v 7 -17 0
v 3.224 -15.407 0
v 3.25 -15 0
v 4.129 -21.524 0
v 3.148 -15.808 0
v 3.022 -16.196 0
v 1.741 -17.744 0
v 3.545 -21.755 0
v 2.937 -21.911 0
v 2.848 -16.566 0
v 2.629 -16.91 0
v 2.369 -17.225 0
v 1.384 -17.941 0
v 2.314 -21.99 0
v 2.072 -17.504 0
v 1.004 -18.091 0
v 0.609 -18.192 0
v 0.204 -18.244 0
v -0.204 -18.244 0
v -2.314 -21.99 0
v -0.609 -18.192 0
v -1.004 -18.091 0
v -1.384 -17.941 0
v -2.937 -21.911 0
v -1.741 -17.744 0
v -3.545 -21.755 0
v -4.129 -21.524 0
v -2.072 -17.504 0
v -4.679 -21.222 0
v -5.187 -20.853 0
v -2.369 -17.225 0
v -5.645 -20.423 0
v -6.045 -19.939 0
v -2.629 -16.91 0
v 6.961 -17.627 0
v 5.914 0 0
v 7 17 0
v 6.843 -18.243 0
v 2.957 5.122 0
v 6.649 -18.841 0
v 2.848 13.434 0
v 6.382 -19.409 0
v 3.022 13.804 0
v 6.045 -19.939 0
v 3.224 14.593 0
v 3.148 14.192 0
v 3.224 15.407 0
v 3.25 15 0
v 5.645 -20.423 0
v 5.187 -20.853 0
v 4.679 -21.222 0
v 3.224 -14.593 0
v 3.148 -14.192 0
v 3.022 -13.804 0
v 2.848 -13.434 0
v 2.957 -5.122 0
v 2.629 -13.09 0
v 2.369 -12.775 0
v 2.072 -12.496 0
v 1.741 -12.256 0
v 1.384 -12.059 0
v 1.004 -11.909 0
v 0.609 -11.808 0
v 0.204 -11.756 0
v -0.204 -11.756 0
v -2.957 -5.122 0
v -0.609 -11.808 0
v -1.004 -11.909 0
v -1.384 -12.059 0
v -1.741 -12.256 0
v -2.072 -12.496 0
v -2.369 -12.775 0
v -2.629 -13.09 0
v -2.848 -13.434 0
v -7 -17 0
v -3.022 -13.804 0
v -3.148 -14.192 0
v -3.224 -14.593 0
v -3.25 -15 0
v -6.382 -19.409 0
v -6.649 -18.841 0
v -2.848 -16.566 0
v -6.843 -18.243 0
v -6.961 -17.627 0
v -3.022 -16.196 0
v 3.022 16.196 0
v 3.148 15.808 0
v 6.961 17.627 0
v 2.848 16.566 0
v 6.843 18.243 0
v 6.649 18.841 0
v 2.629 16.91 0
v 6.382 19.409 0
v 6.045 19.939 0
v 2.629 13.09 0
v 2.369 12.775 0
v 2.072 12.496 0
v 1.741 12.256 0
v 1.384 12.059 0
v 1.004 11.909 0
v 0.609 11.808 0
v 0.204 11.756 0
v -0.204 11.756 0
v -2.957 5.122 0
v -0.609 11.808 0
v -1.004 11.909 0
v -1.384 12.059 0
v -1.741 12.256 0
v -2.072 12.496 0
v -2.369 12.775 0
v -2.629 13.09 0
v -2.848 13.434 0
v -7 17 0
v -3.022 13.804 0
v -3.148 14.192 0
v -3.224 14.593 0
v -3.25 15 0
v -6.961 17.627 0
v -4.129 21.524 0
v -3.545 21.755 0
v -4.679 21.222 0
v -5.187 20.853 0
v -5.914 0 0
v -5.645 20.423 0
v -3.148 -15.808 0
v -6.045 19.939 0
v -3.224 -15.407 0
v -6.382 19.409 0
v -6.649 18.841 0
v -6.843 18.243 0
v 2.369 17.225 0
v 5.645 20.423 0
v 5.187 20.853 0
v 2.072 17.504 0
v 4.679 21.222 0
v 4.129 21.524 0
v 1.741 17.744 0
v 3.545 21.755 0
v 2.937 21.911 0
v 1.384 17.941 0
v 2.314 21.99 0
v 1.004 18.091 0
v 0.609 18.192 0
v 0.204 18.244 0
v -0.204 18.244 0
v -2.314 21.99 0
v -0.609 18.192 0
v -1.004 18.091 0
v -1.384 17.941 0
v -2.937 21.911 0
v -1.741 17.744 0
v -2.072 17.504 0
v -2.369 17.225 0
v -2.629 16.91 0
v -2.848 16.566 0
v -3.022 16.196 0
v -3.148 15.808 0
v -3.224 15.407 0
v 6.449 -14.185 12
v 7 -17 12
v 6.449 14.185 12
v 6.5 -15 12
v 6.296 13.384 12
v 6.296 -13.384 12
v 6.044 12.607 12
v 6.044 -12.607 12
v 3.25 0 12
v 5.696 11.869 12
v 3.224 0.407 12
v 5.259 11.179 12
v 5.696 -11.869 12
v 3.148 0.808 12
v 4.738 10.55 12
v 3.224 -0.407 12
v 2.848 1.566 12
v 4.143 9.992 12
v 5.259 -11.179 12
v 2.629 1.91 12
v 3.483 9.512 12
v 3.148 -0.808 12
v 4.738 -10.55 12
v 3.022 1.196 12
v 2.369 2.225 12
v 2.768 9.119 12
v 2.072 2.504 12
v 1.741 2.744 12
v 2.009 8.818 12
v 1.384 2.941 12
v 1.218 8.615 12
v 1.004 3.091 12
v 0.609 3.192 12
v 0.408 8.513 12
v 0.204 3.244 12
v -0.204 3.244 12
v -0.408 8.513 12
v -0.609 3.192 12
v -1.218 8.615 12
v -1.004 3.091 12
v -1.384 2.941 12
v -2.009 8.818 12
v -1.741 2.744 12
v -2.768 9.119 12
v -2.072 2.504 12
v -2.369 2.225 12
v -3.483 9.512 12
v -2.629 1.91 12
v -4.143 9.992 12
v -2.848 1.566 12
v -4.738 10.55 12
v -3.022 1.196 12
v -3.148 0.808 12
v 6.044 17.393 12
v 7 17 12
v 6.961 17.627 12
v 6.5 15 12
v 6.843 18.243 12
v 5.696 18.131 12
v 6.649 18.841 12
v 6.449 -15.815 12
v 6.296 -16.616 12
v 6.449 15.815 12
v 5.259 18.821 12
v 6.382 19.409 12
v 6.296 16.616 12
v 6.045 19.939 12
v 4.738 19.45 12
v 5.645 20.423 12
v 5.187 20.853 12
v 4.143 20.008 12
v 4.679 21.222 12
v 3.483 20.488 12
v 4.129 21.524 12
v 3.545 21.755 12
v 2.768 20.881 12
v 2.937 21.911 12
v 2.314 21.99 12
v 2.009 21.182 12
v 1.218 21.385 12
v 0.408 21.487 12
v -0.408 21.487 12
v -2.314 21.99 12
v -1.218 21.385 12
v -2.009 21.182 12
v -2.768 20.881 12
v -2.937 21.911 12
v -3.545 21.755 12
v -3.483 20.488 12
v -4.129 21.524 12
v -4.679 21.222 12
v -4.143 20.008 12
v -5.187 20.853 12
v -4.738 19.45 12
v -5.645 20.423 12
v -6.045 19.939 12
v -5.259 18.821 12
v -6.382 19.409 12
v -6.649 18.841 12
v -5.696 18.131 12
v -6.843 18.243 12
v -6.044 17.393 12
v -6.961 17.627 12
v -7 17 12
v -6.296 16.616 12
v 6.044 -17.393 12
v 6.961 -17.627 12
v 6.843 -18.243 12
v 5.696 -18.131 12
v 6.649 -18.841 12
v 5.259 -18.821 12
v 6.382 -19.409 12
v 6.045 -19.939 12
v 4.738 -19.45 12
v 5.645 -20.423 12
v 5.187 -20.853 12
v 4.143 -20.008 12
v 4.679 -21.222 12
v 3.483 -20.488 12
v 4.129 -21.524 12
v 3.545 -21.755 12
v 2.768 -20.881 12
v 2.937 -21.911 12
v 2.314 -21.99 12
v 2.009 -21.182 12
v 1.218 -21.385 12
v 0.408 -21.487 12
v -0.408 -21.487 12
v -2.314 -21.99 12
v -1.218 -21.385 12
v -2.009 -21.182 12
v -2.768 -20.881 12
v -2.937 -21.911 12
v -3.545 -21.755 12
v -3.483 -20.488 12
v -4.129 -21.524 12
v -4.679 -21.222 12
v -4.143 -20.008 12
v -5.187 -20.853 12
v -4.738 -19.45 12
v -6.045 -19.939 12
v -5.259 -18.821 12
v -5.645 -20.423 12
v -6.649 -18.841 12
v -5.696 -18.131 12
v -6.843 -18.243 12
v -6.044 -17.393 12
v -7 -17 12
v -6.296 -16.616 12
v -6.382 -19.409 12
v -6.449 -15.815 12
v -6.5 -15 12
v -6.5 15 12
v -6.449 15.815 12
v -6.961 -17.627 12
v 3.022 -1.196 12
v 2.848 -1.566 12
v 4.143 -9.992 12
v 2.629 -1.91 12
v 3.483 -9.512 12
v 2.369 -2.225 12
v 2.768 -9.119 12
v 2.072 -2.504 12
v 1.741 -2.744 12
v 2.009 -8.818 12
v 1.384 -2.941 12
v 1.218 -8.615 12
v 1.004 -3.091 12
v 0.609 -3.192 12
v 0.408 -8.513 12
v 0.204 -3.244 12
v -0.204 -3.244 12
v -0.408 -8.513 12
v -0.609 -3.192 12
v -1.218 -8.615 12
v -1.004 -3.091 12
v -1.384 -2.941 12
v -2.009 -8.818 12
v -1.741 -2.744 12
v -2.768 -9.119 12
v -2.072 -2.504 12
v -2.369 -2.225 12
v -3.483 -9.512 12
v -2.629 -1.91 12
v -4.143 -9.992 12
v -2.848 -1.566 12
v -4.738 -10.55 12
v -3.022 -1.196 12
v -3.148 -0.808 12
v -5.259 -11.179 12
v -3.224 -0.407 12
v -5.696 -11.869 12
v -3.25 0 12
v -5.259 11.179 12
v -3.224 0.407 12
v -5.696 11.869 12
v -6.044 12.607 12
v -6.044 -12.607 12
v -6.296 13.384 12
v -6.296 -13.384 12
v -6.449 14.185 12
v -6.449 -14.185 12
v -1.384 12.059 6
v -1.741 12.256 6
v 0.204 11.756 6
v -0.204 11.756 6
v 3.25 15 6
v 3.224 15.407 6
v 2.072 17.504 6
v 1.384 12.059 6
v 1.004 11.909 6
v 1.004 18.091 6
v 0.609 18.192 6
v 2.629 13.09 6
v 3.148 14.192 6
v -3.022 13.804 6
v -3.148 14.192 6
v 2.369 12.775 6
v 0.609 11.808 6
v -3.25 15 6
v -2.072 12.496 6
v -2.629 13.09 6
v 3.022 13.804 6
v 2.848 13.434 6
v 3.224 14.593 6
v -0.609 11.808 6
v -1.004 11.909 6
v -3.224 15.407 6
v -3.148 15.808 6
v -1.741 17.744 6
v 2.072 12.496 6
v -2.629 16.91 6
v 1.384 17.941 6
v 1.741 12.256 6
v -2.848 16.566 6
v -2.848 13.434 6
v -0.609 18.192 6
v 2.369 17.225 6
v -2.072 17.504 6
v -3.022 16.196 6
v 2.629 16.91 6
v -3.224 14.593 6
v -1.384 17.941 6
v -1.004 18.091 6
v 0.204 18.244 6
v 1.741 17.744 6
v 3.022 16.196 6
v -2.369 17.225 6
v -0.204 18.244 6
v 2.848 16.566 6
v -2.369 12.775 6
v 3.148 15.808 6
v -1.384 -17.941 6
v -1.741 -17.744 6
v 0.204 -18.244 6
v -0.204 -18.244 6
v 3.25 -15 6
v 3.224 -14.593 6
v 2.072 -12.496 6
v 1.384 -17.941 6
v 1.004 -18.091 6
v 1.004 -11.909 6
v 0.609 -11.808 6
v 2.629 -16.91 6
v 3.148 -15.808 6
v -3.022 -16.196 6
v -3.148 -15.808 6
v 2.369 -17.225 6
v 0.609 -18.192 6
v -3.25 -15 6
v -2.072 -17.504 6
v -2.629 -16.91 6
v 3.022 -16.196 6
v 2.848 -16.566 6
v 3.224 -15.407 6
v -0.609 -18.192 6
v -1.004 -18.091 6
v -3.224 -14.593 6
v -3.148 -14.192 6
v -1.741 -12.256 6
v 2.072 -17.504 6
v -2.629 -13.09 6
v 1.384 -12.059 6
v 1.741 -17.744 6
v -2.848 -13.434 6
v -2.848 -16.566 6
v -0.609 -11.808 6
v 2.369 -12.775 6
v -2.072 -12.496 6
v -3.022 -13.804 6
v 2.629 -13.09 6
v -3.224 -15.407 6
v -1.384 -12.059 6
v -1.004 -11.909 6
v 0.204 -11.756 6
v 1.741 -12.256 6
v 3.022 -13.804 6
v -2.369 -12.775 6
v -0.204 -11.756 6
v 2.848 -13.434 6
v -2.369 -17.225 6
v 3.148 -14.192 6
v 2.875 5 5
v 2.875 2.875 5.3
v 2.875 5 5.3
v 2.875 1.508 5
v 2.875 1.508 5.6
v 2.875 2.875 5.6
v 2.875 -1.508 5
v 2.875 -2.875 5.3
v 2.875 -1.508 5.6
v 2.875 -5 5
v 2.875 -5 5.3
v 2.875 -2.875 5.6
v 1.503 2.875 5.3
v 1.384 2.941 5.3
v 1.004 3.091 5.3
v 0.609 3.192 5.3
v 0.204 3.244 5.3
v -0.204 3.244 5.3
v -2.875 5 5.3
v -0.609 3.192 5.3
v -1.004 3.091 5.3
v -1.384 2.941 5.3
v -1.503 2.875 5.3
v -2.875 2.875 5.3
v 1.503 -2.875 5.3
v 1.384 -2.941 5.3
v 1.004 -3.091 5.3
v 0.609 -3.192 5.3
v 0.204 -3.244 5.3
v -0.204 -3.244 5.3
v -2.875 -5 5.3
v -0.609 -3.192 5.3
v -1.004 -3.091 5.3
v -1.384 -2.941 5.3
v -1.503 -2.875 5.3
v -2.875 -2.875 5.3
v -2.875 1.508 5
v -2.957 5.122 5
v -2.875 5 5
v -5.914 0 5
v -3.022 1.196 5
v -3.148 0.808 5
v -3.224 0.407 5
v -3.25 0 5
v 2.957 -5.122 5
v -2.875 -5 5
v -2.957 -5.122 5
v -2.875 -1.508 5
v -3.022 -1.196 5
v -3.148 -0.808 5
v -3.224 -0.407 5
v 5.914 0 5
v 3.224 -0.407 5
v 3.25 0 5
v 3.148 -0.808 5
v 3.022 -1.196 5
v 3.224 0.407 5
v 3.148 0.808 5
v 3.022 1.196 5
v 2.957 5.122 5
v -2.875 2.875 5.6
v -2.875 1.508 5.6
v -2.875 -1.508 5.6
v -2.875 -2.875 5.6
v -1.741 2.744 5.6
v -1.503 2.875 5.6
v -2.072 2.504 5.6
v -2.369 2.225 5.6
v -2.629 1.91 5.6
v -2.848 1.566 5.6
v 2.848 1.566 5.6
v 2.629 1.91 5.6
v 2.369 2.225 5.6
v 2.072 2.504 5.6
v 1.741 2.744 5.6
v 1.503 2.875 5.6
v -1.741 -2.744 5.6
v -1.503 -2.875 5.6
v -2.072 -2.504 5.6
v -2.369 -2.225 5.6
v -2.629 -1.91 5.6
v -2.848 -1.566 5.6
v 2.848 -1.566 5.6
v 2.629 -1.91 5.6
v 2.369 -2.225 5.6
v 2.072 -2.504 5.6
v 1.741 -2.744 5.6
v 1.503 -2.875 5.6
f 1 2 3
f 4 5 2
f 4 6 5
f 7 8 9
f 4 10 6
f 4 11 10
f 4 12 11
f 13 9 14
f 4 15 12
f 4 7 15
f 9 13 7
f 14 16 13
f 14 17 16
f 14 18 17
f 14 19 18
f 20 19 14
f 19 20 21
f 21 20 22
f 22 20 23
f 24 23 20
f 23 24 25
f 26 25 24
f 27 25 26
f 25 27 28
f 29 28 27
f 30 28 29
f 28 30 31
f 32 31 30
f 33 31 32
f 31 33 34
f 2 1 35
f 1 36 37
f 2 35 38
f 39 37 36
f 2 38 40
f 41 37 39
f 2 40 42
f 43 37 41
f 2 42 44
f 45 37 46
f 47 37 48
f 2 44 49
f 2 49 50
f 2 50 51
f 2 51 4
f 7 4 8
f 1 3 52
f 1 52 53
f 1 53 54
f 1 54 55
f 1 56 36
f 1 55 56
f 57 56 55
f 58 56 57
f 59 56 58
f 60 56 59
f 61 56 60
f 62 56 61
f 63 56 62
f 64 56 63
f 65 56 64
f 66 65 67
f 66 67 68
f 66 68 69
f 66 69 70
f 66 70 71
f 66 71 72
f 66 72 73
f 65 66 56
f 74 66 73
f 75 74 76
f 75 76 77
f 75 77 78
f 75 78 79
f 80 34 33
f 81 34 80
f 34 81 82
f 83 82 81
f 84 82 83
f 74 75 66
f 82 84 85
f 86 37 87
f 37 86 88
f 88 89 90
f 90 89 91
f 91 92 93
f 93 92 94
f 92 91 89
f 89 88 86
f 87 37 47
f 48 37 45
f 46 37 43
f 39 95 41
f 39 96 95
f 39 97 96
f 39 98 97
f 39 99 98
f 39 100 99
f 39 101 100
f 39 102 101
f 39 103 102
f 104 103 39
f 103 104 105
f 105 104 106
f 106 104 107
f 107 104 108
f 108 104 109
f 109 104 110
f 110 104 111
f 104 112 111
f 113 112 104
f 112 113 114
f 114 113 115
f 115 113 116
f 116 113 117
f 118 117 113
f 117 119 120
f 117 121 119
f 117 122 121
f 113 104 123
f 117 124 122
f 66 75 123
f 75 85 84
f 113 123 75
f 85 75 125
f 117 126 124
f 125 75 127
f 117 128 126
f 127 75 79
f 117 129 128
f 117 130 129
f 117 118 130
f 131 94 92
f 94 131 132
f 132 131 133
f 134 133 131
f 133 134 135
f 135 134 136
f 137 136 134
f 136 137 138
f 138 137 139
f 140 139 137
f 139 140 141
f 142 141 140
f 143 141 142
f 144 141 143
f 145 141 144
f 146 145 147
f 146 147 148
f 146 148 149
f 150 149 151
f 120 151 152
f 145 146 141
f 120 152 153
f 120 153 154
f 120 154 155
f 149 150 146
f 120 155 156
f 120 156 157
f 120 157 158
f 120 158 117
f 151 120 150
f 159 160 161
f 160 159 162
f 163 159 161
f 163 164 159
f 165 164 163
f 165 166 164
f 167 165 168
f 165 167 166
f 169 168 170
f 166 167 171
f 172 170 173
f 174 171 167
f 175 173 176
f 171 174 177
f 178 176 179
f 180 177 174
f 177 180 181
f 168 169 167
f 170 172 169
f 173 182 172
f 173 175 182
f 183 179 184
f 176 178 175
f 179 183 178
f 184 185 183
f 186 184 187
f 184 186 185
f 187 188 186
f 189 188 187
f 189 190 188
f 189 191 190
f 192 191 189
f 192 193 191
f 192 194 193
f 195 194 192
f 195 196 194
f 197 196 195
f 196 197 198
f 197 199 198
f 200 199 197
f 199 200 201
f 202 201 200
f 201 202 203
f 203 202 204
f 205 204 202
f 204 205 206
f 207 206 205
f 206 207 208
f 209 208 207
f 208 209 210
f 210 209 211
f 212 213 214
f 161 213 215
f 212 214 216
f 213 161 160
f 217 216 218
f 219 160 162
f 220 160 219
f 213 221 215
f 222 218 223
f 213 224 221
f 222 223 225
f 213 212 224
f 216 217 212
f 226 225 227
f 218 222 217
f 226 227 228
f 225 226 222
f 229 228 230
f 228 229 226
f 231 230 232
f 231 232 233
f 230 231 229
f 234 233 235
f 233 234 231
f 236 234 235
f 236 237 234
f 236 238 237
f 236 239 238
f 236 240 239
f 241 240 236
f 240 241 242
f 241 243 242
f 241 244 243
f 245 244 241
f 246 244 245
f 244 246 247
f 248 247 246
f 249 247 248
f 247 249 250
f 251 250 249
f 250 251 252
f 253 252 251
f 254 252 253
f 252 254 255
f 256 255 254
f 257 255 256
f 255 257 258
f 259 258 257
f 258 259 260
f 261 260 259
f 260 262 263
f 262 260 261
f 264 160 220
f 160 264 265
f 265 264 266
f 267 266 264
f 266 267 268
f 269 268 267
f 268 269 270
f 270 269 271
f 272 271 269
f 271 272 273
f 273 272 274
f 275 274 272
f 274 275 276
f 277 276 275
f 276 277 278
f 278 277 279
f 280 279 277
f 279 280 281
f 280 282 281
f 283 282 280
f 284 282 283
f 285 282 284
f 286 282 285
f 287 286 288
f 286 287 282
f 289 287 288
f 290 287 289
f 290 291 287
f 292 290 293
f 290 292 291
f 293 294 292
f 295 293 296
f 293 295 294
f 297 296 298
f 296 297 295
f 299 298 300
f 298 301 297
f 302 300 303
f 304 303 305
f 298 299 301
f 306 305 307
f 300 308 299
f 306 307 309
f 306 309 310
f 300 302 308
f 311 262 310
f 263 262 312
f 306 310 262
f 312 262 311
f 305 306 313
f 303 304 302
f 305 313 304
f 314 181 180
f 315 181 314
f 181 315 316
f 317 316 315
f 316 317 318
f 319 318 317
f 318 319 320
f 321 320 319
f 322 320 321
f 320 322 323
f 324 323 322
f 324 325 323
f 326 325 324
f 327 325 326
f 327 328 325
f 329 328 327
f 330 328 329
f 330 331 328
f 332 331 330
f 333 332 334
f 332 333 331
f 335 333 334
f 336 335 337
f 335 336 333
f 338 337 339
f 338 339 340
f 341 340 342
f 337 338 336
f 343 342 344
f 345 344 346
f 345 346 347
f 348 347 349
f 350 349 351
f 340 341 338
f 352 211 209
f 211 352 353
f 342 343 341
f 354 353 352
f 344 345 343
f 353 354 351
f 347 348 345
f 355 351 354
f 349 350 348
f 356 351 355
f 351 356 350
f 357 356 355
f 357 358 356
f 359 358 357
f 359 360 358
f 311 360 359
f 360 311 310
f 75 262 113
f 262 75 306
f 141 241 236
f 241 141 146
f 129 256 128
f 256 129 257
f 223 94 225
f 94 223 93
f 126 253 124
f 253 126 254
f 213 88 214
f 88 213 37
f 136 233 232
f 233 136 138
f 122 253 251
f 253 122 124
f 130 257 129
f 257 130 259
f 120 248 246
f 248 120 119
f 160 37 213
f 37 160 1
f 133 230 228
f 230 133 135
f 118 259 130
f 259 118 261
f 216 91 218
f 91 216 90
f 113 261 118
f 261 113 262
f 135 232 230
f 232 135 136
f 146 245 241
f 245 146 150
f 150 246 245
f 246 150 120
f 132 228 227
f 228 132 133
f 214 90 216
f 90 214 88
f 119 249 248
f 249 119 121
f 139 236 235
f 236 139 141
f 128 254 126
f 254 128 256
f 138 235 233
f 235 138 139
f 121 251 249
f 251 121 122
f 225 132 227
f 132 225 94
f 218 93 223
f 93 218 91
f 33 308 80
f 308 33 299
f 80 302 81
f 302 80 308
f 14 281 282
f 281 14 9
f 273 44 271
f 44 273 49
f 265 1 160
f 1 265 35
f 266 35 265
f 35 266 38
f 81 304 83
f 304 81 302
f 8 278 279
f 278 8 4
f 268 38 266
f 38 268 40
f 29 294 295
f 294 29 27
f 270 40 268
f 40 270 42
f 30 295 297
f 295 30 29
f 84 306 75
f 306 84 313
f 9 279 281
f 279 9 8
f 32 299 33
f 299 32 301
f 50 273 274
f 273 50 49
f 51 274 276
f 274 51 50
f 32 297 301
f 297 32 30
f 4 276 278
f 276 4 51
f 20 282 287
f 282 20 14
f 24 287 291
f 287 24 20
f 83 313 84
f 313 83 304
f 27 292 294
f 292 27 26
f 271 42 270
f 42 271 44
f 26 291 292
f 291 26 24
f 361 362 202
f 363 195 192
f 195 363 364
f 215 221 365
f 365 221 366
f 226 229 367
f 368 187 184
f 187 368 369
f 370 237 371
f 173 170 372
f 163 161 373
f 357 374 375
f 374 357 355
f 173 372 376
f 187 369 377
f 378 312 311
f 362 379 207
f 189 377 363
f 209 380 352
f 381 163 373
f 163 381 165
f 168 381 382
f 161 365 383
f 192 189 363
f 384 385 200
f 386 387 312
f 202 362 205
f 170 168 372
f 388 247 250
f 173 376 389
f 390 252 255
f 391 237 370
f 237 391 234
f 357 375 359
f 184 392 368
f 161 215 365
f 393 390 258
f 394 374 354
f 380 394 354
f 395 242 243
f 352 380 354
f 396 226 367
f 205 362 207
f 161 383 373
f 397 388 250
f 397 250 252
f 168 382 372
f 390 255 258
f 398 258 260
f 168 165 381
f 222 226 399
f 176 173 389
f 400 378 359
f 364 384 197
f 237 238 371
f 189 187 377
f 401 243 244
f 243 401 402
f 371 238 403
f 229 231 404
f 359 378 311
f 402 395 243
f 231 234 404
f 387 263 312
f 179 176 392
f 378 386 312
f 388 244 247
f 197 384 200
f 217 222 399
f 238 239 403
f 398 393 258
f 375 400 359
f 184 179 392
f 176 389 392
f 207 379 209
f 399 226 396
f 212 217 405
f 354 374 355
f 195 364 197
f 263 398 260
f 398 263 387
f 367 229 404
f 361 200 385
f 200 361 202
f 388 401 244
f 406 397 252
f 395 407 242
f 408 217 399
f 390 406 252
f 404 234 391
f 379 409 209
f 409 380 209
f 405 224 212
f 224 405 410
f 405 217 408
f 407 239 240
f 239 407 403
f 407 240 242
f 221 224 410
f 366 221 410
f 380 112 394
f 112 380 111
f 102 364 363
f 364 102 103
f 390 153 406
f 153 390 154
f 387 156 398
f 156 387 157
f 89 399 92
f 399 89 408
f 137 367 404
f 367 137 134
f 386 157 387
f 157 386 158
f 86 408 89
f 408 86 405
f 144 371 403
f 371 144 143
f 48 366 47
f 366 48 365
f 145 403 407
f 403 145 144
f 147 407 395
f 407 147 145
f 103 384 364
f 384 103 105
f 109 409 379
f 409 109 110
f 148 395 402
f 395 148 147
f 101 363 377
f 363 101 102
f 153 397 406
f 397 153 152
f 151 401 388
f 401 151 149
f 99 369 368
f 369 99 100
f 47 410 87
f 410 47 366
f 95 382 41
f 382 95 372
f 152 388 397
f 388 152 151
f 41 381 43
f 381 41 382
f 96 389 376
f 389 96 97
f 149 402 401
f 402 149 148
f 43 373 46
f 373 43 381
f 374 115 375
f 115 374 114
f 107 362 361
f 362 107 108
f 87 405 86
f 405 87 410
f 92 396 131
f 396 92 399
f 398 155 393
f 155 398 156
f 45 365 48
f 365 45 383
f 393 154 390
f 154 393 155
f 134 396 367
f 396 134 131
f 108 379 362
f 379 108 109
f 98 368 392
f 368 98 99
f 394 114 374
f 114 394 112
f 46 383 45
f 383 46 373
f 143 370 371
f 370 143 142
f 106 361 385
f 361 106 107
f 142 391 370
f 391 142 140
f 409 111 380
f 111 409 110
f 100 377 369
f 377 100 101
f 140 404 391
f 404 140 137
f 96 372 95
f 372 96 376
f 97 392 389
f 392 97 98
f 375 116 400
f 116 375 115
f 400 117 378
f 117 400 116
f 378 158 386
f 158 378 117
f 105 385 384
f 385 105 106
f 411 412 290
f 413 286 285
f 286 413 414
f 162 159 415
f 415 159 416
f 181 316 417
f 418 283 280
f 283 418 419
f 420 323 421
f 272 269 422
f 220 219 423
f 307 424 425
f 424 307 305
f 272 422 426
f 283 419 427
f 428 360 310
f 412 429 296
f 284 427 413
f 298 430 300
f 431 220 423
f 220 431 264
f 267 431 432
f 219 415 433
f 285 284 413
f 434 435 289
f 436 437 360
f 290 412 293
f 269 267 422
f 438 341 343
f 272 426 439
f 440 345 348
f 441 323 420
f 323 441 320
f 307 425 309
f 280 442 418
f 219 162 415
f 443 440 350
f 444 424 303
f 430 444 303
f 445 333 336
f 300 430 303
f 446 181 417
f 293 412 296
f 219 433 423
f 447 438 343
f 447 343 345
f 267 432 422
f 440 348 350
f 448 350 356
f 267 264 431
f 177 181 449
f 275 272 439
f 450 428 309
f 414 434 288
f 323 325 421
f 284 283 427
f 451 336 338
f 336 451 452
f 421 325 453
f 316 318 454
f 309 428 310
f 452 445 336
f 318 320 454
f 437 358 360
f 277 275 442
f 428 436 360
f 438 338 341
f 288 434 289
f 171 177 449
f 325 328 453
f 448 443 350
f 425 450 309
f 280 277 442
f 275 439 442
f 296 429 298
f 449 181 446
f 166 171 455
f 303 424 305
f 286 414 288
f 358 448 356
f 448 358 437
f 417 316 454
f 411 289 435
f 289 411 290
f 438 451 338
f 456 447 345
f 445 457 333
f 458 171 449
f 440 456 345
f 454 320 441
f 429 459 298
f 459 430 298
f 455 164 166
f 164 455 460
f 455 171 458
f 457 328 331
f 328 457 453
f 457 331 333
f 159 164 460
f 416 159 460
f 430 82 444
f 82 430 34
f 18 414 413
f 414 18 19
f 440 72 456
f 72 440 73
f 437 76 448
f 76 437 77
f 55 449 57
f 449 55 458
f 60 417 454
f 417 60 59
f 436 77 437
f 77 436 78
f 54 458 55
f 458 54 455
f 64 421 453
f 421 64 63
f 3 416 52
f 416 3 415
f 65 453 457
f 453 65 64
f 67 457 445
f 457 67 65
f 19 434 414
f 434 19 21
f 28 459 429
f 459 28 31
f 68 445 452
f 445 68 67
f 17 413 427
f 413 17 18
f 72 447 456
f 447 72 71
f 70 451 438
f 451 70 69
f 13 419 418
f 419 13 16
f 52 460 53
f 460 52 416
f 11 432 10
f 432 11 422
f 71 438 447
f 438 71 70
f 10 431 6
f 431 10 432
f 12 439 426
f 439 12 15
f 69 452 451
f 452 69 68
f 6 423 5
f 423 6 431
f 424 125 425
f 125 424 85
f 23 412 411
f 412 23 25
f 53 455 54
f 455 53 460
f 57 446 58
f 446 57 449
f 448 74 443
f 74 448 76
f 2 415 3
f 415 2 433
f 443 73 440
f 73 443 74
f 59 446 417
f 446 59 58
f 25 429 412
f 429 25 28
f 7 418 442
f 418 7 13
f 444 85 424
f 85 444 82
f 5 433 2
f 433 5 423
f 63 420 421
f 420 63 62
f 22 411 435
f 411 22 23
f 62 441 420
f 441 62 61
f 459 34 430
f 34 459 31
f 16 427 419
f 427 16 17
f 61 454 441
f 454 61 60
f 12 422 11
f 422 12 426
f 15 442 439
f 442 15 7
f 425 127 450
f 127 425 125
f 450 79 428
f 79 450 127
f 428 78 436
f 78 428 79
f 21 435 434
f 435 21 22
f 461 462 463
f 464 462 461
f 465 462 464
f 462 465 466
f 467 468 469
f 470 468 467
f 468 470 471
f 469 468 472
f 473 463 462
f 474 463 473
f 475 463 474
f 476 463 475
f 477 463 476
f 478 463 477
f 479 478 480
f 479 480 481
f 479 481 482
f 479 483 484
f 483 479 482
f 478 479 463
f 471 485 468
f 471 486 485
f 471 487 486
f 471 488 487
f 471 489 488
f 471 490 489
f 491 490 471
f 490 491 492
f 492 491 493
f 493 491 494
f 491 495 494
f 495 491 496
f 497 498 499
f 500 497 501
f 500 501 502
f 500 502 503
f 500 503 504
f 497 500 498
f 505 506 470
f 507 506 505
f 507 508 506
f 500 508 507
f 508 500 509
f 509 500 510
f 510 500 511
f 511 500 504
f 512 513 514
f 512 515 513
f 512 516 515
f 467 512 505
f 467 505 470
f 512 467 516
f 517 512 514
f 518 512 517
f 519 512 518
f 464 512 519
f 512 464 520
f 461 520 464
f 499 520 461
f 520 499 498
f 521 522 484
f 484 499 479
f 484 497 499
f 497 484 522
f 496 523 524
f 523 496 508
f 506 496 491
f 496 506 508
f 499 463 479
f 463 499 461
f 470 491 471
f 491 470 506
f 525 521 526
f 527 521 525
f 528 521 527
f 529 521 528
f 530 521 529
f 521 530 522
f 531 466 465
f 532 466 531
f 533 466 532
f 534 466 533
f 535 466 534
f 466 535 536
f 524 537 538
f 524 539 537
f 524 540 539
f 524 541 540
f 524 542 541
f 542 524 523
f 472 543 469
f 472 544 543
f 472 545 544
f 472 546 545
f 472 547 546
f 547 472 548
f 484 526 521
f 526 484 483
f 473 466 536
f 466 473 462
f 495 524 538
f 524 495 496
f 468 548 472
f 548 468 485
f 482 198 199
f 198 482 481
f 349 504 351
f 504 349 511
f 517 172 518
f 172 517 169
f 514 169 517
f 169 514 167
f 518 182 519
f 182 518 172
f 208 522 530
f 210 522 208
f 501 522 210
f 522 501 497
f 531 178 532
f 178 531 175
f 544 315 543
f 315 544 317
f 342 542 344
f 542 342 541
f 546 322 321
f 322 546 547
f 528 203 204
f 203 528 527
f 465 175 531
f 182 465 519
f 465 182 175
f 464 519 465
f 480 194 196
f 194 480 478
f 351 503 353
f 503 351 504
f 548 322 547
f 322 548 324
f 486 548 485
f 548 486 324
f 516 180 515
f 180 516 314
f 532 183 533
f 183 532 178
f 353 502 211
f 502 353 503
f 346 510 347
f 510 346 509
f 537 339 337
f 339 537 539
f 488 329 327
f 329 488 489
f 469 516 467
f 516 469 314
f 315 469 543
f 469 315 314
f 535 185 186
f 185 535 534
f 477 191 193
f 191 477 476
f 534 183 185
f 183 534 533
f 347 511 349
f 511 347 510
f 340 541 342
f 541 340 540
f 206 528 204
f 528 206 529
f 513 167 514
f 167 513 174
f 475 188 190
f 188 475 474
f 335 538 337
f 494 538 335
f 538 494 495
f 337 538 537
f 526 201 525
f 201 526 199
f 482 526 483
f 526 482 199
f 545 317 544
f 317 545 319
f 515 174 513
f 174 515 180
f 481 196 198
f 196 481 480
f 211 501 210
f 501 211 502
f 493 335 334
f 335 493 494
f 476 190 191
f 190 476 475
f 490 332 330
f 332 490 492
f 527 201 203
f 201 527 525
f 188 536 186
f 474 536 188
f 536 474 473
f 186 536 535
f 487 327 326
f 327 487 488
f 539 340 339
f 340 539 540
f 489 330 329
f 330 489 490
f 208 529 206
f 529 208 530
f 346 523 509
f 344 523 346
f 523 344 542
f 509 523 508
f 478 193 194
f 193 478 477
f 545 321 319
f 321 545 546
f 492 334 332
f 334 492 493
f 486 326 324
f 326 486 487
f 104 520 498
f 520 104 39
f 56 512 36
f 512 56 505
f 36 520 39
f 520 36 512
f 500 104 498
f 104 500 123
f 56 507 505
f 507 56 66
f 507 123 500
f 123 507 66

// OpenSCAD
$fn = 50;


difference() {
	union() {
		cylinder(h = 12, r = 7.0000000000);
		translate(v = [0.0000000000, 7.5000000000, 0]) {
			hull() {
				translate(v = [-2.0000000000, 9.5000000000, 0]) {
					cylinder(h = 12, r = 5);
				}
				translate(v = [2.0000000000, 9.5000000000, 0]) {
					cylinder(h = 12, r = 5);
				}
				translate(v = [-2.0000000000, -9.5000000000, 0]) {
					cylinder(h = 12, r = 5);
				}
				translate(v = [2.0000000000, -9.5000000000, 0]) {
					cylinder(h = 12, r = 5);
				}
			}
		}
		translate(v = [0.0000000000, 7.5000000000, 0]) {
			hull() {
				translate(v = [-2.0000000000, 9.5000000000, 0]) {
					cylinder(h = 12, r = 5);
				}
				translate(v = [2.0000000000, 9.5000000000, 0]) {
					cylinder(h = 12, r = 5);
				}
				translate(v = [-2.0000000000, -9.5000000000, 0]) {
					cylinder(h = 12, r = 5);
				}
				translate(v = [2.0000000000, -9.5000000000, 0]) {
					cylinder(h = 12, r = 5);
				}
			}
		}
		translate(v = [0.0000000000, -7.5000000000, 0]) {
			hull() {
				translate(v = [-2.0000000000, 9.5000000000, 0]) {
					cylinder(h = 12, r = 5);
				}
				translate(v = [2.0000000000, 9.5000000000, 0]) {
					cylinder(h = 12, r = 5);
				}
				translate(v = [-2.0000000000, -9.5000000000, 0]) {
					cylinder(h = 12, r = 5);
				}
				translate(v = [2.0000000000, -9.5000000000, 0]) {
					cylinder(h = 12, r = 5);
				}
			}
		}
		translate(v = [0.0000000000, -7.5000000000, 0]) {
			hull() {
				translate(v = [-2.0000000000, 9.5000000000, 0]) {
					cylinder(h = 12, r = 5);
				}
				translate(v = [2.0000000000, 9.5000000000, 0]) {
					cylinder(h = 12, r = 5);
				}
				translate(v = [-2.0000000000, -9.5000000000, 0]) {
					cylinder(h = 12, r = 5);
				}
				translate(v = [2.0000000000, -9.5000000000, 0]) {
					cylinder(h = 12, r = 5);
				}
			}
		}
	}
	union() {
		translate(v = [0.0000000000, 15.0000000000, 12]) {
			rotate(a = [0, 0, 0]) {
				difference() {
					union() {
						#translate(v = [0, 0, -12.0000000000]) {
							cylinder(h = 12, r = 2.2500000000);
						}
						#translate(v = [0, 0, -6]) {
							cylinder(h = 6, r1 = 3.2500000000, r2 = 6.5000000000);
						}
						#translate(v = [0, 0, -12.0000000000]) {
							cylinder(h = 12, r = 3.2500000000);
						}
						#translate(v = [0, 0, -12.0000000000]) {
							cylinder(h = 12, r = 2.2500000000);
						}
					}
					union();
				}
			}
		}
		translate(v = [0.0000000000, 15.0000000000, 12]) {
			rotate(a = [0, 0, 0]) {
				difference() {
					union() {
						#translate(v = [0, 0, -12.0000000000]) {
							cylinder(h = 12, r = 2.2500000000);
						}
						#translate(v = [0, 0, -6]) {
							cylinder(h = 6, r1 = 3.2500000000, r2 = 6.5000000000);
						}
						#translate(v = [0, 0, -12.0000000000]) {
							cylinder(h = 12, r = 3.2500000000);
						}
						#translate(v = [0, 0, -12.0000000000]) {
							cylinder(h = 12, r = 2.2500000000);
						}
					}
					union();
				}
			}
		}
		translate(v = [0.0000000000, -15.0000000000, 12]) {
			rotate(a = [0, 0, 0]) {
				difference() {
					union() {
						#translate(v = [0, 0, -12.0000000000]) {
							cylinder(h = 12, r = 2.2500000000);
						}
						#translate(v = [0, 0, -6]) {
							cylinder(h = 6, r1 = 3.2500000000, r2 = 6.5000000000);
						}
						#translate(v = [0, 0, -12.0000000000]) {
							cylinder(h = 12, r = 3.2500000000);
						}
						#translate(v = [0, 0, -12.0000000000]) {
							cylinder(h = 12, r = 2.2500000000);
						}
					}
					union();
				}
			}
		}
		translate(v = [0.0000000000, -15.0000000000, 12]) {
			rotate(a = [0, 0, 0]) {
				difference() {
					union() {
						#translate(v = [0, 0, -12.0000000000]) {
							cylinder(h = 12, r = 2.2500000000);
						}
						#translate(v = [0, 0, -6]) {
							cylinder(h = 6, r1 = 3.2500000000, r2 = 6.5000000000);
						}
						#translate(v = [0, 0, -12.0000000000]) {
							cylinder(h = 12, r = 3.2500000000);
						}
						#translate(v = [0, 0, -12.0000000000]) {
							cylinder(h = 12, r = 2.2500000000);
						}
					}
					union();
				}
			}
		}
		translate(v = [0.0000000000, 0.0000000000, 0]) {
			rotate(a = [0, 0, 0]) {
				difference() {
					union() {
						#translate(v = [-2.8750000000, -5.0000000000, -0.3000000000]) {
							cube(size = [5.7500000000, 10, 0.3000000000]);
						}
						#translate(v = [-2.8750000000, -2.8750000000, -0.6000000000]) {
							cube(size = [5.7500000000, 5.7500000000, 0.3000000000]);
						}
						#translate(v = [-2.8750000000, -5.0000000000, 5]) {
							cube(size = [5.7500000000, 10, 0.3000000000]);
						}
						#translate(v = [-2.8750000000, -2.8750000000, 5.3000000000]) {
							cube(size = [5.7500000000, 5.7500000000, 0.3000000000]);
						}
						#translate(v = [0, 0, -100.0000000000]) {
							cylinder(h = 200, r = 3.2500000000);
						}
						#linear_extrude(height = 5) {
							polygon(points = [[5.9142500000, 0.0000000000], [2.9571250000, 5.1218907443], [-2.9571250000, 5.1218907443], [-5.9142500000, 0.0000000000], [-2.9571250000, -5.1218907443], [2.9571250000, -5.1218907443]]);
						}
						#translate(v = [-2.8750000000, -5.0000000000, -0.3000000000]) {
							cube(size = [5.7500000000, 10, 0.3000000000]);
						}
						#translate(v = [-2.8750000000, -2.8750000000, -0.6000000000]) {
							cube(size = [5.7500000000, 5.7500000000, 0.3000000000]);
						}
						#translate(v = [-2.8750000000, -5.0000000000, 5]) {
							cube(size = [5.7500000000, 10, 0.3000000000]);
						}
						#translate(v = [-2.8750000000, -2.8750000000, 5.3000000000]) {
							cube(size = [5.7500000000, 5.7500000000, 0.3000000000]);
						}
						#translate(v = [0, 0, -100.0000000000]) {
							cylinder(h = 200, r = 3.2500000000);
						}
						#translate(v = [-2.8750000000, -5.0000000000, -0.3000000000]) {
							cube(size = [5.7500000000, 10, 0.3000000000]);
						}
						#translate(v = [-2.8750000000, -2.8750000000, -0.6000000000]) {
							cube(size = [5.7500000000, 5.7500000000, 0.3000000000]);
						}
						#translate(v = [-2.8750000000, -5.0000000000, 5]) {
							cube(size = [5.7500000000, 10, 0.3000000000]);
						}
						#translate(v = [-2.8750000000, -2.8750000000, 5.3000000000]) {
							cube(size = [5.7500000000, 5.7500000000, 0.3000000000]);
						}
						#translate(v = [0, 0, -100.0000000000]) {
							cylinder(h = 200, r = 3.2500000000);
						}
					}
					union();
				}
			}
		}
		translate(v = [0, 0, -100]) {
			cylinder(h = 200, r = 3.2500000000);
		}
		translate(v = [0, 0, -100]) {
			cylinder(h = 200, r = 1.8000000000);
		}
	}
}
